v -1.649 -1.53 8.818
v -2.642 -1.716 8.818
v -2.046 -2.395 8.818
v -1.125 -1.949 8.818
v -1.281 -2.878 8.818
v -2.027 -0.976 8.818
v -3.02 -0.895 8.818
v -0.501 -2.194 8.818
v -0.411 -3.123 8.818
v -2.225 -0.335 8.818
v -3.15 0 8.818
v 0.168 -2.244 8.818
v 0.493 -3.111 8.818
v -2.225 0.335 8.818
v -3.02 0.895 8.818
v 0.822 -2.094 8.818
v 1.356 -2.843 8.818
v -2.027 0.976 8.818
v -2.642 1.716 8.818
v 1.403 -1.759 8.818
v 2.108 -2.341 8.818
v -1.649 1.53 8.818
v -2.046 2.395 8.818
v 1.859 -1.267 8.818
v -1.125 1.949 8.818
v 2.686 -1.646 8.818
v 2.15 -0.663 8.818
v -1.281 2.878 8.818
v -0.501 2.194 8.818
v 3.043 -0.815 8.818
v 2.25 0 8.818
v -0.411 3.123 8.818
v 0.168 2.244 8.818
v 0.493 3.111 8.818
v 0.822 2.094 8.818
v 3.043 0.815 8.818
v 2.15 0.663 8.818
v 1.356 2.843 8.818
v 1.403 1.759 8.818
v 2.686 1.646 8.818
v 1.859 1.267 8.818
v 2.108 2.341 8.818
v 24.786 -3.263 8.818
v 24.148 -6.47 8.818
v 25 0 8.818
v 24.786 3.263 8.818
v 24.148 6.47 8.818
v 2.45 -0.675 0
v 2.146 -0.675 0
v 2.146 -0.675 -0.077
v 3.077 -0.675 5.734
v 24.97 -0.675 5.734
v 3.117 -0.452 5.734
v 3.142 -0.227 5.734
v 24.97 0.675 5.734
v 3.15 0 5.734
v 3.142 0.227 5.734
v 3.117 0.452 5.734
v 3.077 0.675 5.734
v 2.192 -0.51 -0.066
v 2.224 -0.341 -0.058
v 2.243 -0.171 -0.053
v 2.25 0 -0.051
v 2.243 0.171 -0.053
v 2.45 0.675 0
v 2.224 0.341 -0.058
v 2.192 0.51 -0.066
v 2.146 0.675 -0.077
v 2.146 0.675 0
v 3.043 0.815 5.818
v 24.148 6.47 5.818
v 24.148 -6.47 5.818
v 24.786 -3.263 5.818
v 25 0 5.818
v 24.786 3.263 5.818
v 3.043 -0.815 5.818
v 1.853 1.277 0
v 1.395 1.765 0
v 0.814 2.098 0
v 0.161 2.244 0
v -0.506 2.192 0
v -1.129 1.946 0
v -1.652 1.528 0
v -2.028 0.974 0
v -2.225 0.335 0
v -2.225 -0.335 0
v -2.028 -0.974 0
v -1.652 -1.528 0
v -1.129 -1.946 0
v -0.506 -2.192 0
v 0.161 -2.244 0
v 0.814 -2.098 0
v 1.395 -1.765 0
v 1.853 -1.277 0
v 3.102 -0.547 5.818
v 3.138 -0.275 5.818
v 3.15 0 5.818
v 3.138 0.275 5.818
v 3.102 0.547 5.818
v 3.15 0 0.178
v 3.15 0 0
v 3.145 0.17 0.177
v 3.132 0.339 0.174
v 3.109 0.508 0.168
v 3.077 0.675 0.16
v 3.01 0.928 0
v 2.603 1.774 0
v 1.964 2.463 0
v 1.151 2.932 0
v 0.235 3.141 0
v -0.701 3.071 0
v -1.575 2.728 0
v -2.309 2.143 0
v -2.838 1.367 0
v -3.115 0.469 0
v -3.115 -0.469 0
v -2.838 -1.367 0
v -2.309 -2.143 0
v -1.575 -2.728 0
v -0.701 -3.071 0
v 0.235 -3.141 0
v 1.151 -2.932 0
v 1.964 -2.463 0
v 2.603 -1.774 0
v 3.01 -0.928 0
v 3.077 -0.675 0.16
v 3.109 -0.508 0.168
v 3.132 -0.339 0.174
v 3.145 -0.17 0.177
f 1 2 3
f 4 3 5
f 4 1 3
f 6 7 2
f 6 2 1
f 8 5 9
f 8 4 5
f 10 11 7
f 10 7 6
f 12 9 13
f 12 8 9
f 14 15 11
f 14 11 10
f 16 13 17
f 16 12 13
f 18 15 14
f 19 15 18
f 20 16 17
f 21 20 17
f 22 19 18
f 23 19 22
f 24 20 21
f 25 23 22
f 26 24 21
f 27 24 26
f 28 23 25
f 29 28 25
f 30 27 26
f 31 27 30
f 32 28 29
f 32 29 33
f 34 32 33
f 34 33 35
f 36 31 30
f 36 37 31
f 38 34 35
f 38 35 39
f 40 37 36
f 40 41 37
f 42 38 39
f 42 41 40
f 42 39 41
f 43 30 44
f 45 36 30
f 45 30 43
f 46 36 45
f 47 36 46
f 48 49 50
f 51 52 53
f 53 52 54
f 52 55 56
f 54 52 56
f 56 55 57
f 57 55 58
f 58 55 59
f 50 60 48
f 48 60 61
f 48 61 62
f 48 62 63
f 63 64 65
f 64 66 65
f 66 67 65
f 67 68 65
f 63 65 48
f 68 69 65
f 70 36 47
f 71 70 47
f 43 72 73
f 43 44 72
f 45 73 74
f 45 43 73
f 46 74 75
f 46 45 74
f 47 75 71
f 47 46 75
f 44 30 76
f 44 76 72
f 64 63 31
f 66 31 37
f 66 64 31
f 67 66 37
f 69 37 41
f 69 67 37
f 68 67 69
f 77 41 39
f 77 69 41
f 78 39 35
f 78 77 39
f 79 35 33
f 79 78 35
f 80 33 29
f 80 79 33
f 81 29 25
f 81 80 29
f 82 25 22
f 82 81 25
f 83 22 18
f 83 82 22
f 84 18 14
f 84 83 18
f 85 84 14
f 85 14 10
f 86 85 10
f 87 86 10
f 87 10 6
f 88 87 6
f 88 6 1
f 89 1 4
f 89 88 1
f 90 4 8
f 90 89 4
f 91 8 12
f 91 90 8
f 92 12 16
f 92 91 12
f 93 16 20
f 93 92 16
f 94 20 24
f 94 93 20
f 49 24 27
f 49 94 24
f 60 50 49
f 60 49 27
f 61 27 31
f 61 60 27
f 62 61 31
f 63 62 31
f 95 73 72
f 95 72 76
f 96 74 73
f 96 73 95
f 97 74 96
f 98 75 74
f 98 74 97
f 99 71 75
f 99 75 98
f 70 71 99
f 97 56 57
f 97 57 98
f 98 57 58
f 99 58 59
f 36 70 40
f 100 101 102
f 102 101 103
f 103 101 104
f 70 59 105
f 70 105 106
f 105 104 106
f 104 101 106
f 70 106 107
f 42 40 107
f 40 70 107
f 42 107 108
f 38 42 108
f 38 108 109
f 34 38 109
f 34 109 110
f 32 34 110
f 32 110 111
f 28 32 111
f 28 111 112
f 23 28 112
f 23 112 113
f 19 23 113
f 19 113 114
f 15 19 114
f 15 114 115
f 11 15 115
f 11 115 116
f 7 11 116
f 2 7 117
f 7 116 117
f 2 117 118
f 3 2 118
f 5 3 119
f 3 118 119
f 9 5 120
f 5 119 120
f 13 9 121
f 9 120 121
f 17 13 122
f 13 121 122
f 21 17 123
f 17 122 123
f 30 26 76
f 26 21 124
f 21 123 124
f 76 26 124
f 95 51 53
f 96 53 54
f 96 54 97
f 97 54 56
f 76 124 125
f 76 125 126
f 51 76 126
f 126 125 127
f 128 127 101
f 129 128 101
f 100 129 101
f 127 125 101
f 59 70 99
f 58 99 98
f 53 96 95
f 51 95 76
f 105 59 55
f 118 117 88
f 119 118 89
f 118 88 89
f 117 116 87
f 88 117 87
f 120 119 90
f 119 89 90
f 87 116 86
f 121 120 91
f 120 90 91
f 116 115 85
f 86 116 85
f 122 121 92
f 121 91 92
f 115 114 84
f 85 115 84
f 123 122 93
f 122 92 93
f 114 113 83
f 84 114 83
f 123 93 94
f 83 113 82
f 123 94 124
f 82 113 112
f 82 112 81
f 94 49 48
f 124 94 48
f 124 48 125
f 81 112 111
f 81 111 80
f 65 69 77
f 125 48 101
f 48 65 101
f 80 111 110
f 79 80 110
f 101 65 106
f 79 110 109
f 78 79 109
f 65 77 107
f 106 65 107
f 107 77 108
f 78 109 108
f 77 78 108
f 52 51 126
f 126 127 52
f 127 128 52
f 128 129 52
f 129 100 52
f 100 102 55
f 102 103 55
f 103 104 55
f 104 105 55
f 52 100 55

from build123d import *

# Parameters (mm, degrees)
CYLINDER003006_R               = 2.25
CYLINDER003006_DEPTH           = 11
CYLINDER003005_R               = 3.15
CYLINDER003005_DEPTH           = 8.8181
PAD_DEPTH                      = 1.35
CYLINDER003004_W               = 25
CYLINDER003004_H               = 3
CYLINDER003004_ANGLE           = 30
CYLINDER003004_PLACEMENT_ANGLE = -15


with BuildPart() as hueco_central_paso_barra_escalera:
    # Cylinder003006 → Cylinder003006 (new body)
    with BuildSketch(Plane.XY.offset(-1)):
        Circle(CYLINDER003006_R)
    extrude(amount=CYLINDER003006_DEPTH)


with BuildPart() as exterior_cilindro_central:
    # Cylinder003005 → Cylinder003005 (new body)
    with BuildSketch(Plane.XY):
        Circle(CYLINDER003005_R)
    extrude(amount=CYLINDER003005_DEPTH)


with BuildPart() as refuerzo_angular_pelda_o:
    # Sketch → Pad (new body)
    with BuildSketch(Plane(origin=(2.12, 0.675, 0), x_dir=(1, 0, 0), z_dir=(0, -1, 0))):
        Polygon((0, -0.084088), (22.85, 5.734012), (0, 5.734012), align=None)
    extrude(amount=PAD_DEPTH)


with BuildPart() as master_pelda_o_escalera_de_caracol:
    # Cylinder003004 → Cylinder003004 (revolve)
    with BuildSketch(Plane.XZ):
        with Locations((12.5, 1.5)):
            Rectangle(CYLINDER003004_W, CYLINDER003004_H)
    revolve(axis=Axis((0, 0, 0), (0, 0, 1)), revolution_arc=CYLINDER003004_ANGLE)


with BuildPart() as master_pelda_o_escalera_de_caracol_1:
    # Cylinder003004 placement: moved
    add(master_pelda_o_escalera_de_caracol.part.moved(Location((0, 0, 5.8181))).rotate(Axis((0, 0, 5.8181), (0, 0, 1)), CYLINDER003004_PLACEMENT_ANGLE))

    # Fusion009: union Exterior  cilindro central, Refuerzo angular peldaño
    add(exterior_cilindro_central.part)
    add(refuerzo_angular_pelda_o.part)

    # Cut013: cut Hueco central paso barra escalera
    add(hueco_central_paso_barra_escalera.part, mode=Mode.SUBTRACT)


solid = master_pelda_o_escalera_de_caracol_1.part
